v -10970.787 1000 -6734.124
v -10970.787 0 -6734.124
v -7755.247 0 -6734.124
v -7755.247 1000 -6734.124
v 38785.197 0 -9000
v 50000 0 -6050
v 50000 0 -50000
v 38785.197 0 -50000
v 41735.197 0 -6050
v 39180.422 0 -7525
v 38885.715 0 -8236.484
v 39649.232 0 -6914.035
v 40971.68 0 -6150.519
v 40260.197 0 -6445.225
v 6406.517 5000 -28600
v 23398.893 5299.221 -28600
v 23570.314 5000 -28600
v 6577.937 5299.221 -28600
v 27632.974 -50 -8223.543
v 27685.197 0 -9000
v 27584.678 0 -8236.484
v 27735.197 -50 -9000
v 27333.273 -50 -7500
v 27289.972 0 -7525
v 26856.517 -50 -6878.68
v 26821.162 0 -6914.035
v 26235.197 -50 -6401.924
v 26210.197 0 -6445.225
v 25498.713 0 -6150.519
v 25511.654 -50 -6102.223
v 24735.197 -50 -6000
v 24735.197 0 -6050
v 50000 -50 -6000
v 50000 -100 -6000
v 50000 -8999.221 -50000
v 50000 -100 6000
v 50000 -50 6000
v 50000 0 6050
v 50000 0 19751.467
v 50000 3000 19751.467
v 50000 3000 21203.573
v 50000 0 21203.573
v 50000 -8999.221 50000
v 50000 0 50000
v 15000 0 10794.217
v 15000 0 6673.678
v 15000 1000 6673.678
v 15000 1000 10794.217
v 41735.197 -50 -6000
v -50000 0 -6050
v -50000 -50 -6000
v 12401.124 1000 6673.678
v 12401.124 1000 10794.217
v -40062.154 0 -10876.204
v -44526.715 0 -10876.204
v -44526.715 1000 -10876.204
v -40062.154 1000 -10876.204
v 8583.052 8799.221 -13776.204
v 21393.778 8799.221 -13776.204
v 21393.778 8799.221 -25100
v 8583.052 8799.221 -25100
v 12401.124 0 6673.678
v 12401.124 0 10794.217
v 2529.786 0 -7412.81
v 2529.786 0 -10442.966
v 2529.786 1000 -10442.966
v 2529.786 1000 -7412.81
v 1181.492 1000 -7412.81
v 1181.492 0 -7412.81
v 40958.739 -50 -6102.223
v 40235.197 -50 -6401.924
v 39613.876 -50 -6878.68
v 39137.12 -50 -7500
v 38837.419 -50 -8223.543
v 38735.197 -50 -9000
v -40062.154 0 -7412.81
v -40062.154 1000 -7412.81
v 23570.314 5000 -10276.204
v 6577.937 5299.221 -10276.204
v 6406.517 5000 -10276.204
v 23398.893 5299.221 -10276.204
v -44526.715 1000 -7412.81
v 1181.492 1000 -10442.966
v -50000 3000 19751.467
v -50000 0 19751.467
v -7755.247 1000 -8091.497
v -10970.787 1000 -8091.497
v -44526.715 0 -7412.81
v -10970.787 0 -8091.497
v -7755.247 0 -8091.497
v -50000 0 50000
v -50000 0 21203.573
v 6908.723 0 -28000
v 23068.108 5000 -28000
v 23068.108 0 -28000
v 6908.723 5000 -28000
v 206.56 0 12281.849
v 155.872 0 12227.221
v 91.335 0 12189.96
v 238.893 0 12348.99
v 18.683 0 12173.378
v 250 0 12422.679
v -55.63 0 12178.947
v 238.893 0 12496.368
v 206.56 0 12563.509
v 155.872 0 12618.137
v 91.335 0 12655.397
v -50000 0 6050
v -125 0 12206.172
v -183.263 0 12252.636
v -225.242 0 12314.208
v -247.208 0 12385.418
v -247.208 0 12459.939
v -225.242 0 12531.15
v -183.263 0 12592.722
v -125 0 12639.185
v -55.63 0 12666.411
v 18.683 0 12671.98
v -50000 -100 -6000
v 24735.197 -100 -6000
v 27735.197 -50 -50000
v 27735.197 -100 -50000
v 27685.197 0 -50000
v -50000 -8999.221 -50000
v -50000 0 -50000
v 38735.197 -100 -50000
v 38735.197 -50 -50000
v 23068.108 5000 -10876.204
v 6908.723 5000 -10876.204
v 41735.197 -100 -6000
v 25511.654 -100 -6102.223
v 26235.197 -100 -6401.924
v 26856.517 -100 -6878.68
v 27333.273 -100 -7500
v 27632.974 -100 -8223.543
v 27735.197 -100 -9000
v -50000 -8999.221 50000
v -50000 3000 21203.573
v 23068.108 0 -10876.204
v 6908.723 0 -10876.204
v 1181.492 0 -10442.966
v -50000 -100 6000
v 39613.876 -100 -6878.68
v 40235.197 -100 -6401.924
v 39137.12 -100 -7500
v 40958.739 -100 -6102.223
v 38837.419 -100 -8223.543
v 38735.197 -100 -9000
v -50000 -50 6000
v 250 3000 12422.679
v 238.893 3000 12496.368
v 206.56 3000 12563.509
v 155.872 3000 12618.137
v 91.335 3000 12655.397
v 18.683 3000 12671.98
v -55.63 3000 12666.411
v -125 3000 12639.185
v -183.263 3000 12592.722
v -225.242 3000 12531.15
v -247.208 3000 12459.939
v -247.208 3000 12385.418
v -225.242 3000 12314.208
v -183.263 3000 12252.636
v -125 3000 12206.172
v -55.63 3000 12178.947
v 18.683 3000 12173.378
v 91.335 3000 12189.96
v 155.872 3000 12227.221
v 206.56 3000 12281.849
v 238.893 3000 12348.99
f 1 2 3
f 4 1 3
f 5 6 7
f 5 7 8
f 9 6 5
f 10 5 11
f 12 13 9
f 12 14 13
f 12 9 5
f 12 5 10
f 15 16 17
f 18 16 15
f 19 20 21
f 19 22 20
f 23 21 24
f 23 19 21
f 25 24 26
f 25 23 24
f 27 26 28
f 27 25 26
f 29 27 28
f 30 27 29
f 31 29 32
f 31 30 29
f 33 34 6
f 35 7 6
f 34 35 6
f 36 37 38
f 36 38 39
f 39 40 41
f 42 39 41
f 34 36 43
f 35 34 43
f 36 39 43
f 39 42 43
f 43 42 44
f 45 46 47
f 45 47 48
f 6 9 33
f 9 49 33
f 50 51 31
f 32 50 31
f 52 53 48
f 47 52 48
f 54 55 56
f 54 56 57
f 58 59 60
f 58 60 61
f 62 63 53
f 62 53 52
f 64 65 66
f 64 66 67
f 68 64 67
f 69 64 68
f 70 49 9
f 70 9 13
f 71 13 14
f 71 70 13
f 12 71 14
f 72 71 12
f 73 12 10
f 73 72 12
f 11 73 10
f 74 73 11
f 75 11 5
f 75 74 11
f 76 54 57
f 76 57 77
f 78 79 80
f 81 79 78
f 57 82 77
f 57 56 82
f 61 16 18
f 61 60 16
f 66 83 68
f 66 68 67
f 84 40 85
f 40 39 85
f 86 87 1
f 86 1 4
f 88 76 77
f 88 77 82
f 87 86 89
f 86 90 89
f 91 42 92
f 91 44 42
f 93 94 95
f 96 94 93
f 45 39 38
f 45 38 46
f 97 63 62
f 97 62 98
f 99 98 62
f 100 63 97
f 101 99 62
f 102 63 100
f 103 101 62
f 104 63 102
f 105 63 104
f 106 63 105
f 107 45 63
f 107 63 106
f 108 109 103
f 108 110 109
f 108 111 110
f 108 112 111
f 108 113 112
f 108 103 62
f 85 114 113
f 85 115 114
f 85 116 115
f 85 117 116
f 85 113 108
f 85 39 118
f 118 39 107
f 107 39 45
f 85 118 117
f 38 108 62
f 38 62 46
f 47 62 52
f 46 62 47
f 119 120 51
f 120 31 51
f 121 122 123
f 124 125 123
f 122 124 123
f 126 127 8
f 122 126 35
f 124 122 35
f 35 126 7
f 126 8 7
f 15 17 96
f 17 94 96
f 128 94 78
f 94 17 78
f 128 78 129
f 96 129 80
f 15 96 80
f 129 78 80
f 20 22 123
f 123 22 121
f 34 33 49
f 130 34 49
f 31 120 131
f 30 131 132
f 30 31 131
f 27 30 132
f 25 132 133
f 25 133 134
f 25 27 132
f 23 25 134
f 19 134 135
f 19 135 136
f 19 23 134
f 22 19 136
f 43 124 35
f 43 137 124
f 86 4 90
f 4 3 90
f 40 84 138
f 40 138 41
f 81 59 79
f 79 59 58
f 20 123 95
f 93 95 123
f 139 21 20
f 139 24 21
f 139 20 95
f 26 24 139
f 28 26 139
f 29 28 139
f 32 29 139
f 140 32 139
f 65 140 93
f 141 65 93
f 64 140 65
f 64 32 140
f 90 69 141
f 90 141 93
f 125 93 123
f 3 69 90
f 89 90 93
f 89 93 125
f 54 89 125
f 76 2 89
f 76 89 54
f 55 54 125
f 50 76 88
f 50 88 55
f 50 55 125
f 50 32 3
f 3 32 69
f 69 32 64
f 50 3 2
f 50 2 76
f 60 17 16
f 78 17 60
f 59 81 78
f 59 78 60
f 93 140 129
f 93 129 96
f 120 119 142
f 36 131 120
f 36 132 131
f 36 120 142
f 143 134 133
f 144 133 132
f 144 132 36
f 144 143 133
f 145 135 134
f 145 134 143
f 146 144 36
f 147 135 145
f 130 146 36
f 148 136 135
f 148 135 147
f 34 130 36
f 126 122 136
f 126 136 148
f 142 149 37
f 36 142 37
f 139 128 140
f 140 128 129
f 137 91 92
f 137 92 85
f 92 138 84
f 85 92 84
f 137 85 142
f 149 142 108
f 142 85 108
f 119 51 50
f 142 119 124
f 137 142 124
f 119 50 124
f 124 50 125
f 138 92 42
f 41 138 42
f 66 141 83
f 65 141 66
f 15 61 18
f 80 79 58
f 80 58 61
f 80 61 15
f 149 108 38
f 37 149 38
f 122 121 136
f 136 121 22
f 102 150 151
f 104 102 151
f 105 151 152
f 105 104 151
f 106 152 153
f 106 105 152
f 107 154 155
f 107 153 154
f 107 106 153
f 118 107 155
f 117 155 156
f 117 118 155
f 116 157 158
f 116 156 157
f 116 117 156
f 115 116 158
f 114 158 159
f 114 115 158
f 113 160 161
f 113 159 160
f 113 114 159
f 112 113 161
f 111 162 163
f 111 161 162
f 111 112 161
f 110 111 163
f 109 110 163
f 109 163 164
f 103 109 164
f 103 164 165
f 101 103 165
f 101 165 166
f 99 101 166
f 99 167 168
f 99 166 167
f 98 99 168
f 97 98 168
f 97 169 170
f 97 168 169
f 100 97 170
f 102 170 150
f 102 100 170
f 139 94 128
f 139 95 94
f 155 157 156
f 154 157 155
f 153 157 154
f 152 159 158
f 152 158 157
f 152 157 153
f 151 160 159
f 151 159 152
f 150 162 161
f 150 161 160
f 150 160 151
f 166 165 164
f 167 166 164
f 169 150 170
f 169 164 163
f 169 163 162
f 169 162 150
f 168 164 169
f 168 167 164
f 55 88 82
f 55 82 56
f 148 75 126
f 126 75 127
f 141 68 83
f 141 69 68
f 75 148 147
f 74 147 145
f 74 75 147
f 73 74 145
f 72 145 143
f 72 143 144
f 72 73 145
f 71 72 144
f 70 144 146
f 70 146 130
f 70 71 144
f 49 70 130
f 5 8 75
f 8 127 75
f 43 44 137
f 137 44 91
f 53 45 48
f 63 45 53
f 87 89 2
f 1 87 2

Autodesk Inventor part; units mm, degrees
ref_plane "YZ Plane" through (0, 0, 0) normal (1, 0, 0) x (0, 1, 0)
ref_plane "XZ Plane" through (0, 0, 0) normal (0, 1, 0) x (-1, 0, 0)
sketch "Sketch1" plane through (0, 0, 0) normal (0, 1, 0) x (-1, 0, 0)
  line L0 (50000, 50000) -> (-50000, 50000)
  line L1 (-50000, 50000) -> (-50000, -50000)
  line L2 (-50000, -50000) -> (50000, -50000)
  line L3 (50000, -50000) -> (50000, 50000)
  line L4 (50000, 50000) -> (-50000, -50000) construction
  line L5 (-50000, 50000) -> (50000, -50000) construction
  point P0 (0, 0)
  dimension "d0" = 100000
  dimension "d1" = 100000
extrude "Extrusion1" add sketch "Sketch1" against normal blind 3000
sketch "Sketch2" plane through (0, 0, 0) normal (0, 1, 0) x (1, 0, 0)
  line L0 (50000, -50000) -> (50000, 50000) projected
  line L1 (50000, 50000) -> (-50000, 50000) projected
  line L2 (-50000, 50000) -> (-50000, -50000) projected
  line L3 (-50000, -50000) -> (50000, -50000) projected
  line L4 (50000, 50000) -> (50000, -50000) projected
  line L5 (-50000, -6000) -> (50000, -6000)
  line L6 (50000, -6000) -> (50000, 6000)
  line L7 (-50000, 6000) -> (-50000, -6000)
  line L8 (-50000, -6000) -> (50000, 6000) construction
  line L9 (50000, -6000) -> (-50000, 6000) construction
  line L10 (-50000, 50000) -> (50000, 50000) projected
  line L11 (38735.1966, 9000) -> (38735.1966, 50000)
  line L12 (38735.1966, 50000) -> (27735.1966, 50000)
  line L13 (27735.1966, 50000) -> (27735.1966, 9000)
  line L14 (50000, 6000) -> (41735.1966, 6000)
  line L15 (24735.1966, 6000) -> (-50000, 6000)
  arc A0 (24735.1966, 6000) -> (27735.1966, 9000) centre (24735.1966, 9000) ccw
  arc A1 (38735.1966, 9000) -> (41735.1966, 6000) centre (41735.1966, 9000) ccw
  point P0 (0, 0)
  dimension "d5" = 11000
  dimension "d6" = 3000
extrude "Extrusion2" cut sketch "Sketch2" against normal blind 100 contours L5 L2 L15 A0 L13 L1 L11 A1 L14 L0
sketch "Sketch3" plane through (0, 0, 0) normal (0, 1, 0) x (1, 0, 0)
  line L0 (50000, 50000) -> (50000, -50000) projected
  line L1 (50000, -50000) -> (-50000, -50000) projected
  line L2 (-50000, -50000) -> (-50000, 50000) projected
  line L3 (-50000, 50000) -> (50000, 50000) projected
  line L4 (-50000, 6000) -> (24735.1966, 6000) projected
  arc A0 (24735.1966, 6000) -> (27735.1966, 9000) centre (24735.1966, 9000) ccw projected
  line L5 (27735.1966, 9000) -> (27735.1966, 50000) projected
  line L6 (27735.1966, 50000) -> (-50000, 50000) projected
  line L7 (-50000, 50000) -> (-50000, 6000) projected
  line L8 (23068.1077, 10876.2035) -> (6908.7226, 10876.2035)
  line L9 (6908.7226, 10876.2035) -> (6908.7226, 28000)
  line L10 (6908.7226, 28000) -> (23068.1077, 28000)
  line L11 (23068.1077, 28000) -> (23068.1077, 10876.2035)
  line L12 (23068.1077, 10876.2035) -> (6908.7226, 28000) construction
  line L13 (6908.7226, 10876.2035) -> (23068.1077, 28000) construction
  point P0 (0, 0)
  point P1 (14988.4151, 19438.1018)
extrude "Extrusion3" add sketch "Sketch3" along normal blind 5000 contours L8 L9 L10 L11
sketch "Sketch4" plane through (23068.1077, 0, -28000) normal (0, 0, -1) x (-1, 0, 0)
  line L0 (16159.3851, 0) -> (0, 0) projected
  line L1 (16159.3851, 0) -> (16159.3851, 5000) projected
  line L2 (0, 5000) -> (16159.3851, 5000) projected
  line L3 (0, 0) -> (0, 5000) projected
  line L4 (0, 5000) -> (16159.3851, 5000) projected
  line L5 (0, 5000) -> (-502.206, 5000)
  line L6 (-502.206, 5000) -> (1674.3292, 8799.2208)
  line L7 (1674.3292, 8799.2208) -> (8079.6925, 8799.2208)
  line L8 (8079.6925, 5000) -> (8079.6925, 8799.2208)
  line L9 (16159.3851, 5000) -> (16661.5911, 5000)
  line L10 (16661.5911, 5000) -> (14485.0559, 8799.2208)
  line L11 (14485.0559, 8799.2208) -> (8079.6925, 8799.2208)
  point P0 (23068.1077, 0)
extrude "Extrusion4" add sketch "Sketch4" against normal up to surface (17123.7965 mm away) contours L2 L8 L11 L10 L9 | L5 L6 L7 L8 L2
sketch "Sketch5" plane through (6908.7226, 0, -10876.2035) normal (0, 0, 1) x (1, 0, 0)
  line L0 (16159.3851, 0) -> (0, 0) projected
  line L1 (16159.3851, 0) -> (16159.3851, 5000) projected
  line L2 (16661.5911, 5000) -> (16159.3851, 5000) projected
  line L3 (14485.0559, 8799.2208) -> (16661.5911, 5000) projected
  line L4 (1674.3292, 8799.2208) -> (14485.0559, 8799.2208) projected
  line L5 (-502.206, 5000) -> (1674.3292, 8799.2208) projected
  line L6 (0, 5000) -> (-502.206, 5000) projected
  line L7 (0, 0) -> (0, 5000) projected
  line L8 (0, 5000) -> (-502.206, 5000) projected
  line L9 (16661.5911, 5000) -> (16159.3851, 5000) projected
  line L10 (0, 5000) -> (16159.3851, 5000)
  point P0 (-6908.7226, 0)
extrude "Extrusion5" add sketch "Sketch5" along normal blind 600 contours L10 L6 L5 L4 L3 L2
ref_plane "Work Plane1" through (23068.1077, 0, -19438.1018) normal (0, 0, -1) x (-1, 0, 0)
mirror "Mirror1" about plane through (23068.1077, 0, -19438.1018) normal (0, 0, -1) of "Extrusion5"
chamfer "Chamfer1" distance 50 angle 45 7 edges at (-12632.4017, 0, -6000) (26856.517, 0, -6878.6797) (27735.1966, 0, -29500) (0, 0, 6000) (38735.1966, 0, -29500) (39613.8763, 0, -6878.6797) (45867.5983, 0, -6000)
chamfer "Chamfer2" distance 3500 angle 45 2 edges at (14988.4151, 8799.2208, -10276.2035) (14988.4151, 8799.2208, -28600)
sketch "Sketch6" plane through (0, 0, 0) normal (0, 1, 0) x (1, 0, 0)
  line L0 (-50000, -6050) -> (50000, -6050) projected
  line L1 (-50000, -6050) -> (-50000, -50000) projected
  line L2 (-50000, -50000) -> (50000, -50000) projected
  line L3 (50000, -50000) -> (50000, -6050) projected
  circle A0 centre (0, -12422.6788) radius 250
  point P0 (0, 0)
  dimension "d21" = 500
  dimension "d23" = 37577.3212
extrude "Extrusion6" add sketch "Sketch6" along normal blind 3000 contours A0
pattern_linear "Rectangular Pattern1" [suppressed]
sketch "Sketch7" plane through (0, 0, 0) normal (0, 1, 0) x (1, 0, 0)
  circle A0 centre (0, -12422.6788) radius 250 projected
  line L0 (-50000, -6050) -> (50000, -6050) projected
  line L1 (-50000, -6050) -> (-50000, -50000) projected
  line L2 (-50000, -50000) -> (50000, -50000) projected
  line L3 (50000, -50000) -> (50000, -6050) projected
  line L4 (-50000, -6050) -> (-50000, -50000) projected
  line L5 (50000, 50000) -> (50000, -50000) projected
  line L6 (-50000, -21203.5733) -> (50000, -21203.5733)
  line L7 (50000, -21203.5733) -> (50000, -19751.467)
  line L8 (50000, -19751.467) -> (-50000, -19751.467)
  line L9 (-50000, -19751.467) -> (-50000, -21203.5733)
  point P0 (0, 0)
  point P1 (-50000, -19751.467)
  point P2 (50000, -21203.5733)
extrude "Extrusion7" add sketch "Sketch7" along normal blind 3000 contours L8 L3 L6 L1
sketch "Sketch8" plane through (0, 0, 0) normal (0, 1, 0) x (1, 0, 0)
  line L0 (27685.1966, 50000) -> (27685.1966, 9000) projected
  line L1 (27685.1966, 50000) -> (-50000, 50000) projected
  line L2 (-50000, 50000) -> (-50000, 6050) projected
  line L3 (24735.1966, 6050) -> (-50000, 6050) projected
  arc A0 (24735.1966, 6050) -> (27685.1966, 9000) centre (24735.1966, 9000) ccw projected
  line L4 (23068.1077, 28000) -> (23068.1077, 10876.2035) projected
  line L5 (23068.1077, 10876.2035) -> (6908.7226, 10876.2035) projected
  line L6 (6908.7226, 10876.2035) -> (6908.7226, 28000) projected
  line L7 (6908.7226, 28000) -> (23068.1077, 28000) projected
  line L8 (-50000, -19751.467) -> (50000, -19751.467) projected
  line L9 (50000, -19751.467) -> (50000, -6050) projected
  line L10 (-50000, -6050) -> (50000, -6050) projected
  line L11 (-50000, -6050) -> (-50000, -19751.467) projected
  circle A1 centre (0, -12422.6788) radius 250 projected
  line L12 (-7755.2468, 8091.4966) -> (-10970.7872, 8091.4966)
  line L13 (-10970.7872, 8091.4966) -> (-10970.7872, 6734.1239)
  line L14 (-10970.7872, 6734.1239) -> (-7755.2468, 6734.1239)
  line L15 (-7755.2468, 6734.1239) -> (-7755.2468, 8091.4966)
  line L16 (-3927.8334, -1038.8233) -> (-1060.9343, -1038.8233)
  line L17 (-1060.9343, -1038.8233) -> (-1060.9343, -3437.3677)
  line L18 (-1060.9343, -3437.3677) -> (-3927.8334, -3437.3677)
  line L19 (-3927.8334, -3437.3677) -> (-3927.8334, -1038.8233)
  line L20 (-22605.2556, -1038.8233) -> (-21044.0729, -1038.8233)
  line L21 (-21044.0729, -1038.8233) -> (-21044.0729, -5069.5133)
  line L22 (-21044.0729, -5069.5133) -> (-22605.2556, -5069.5133)
  line L23 (-22605.2556, -5069.5133) -> (-22605.2556, -1038.8233)
  line L24 (1181.4921, 10442.9662) -> (2529.7862, 10442.9662)
  line L25 (2529.7862, 10442.9662) -> (2529.7862, 7412.8102)
  line L26 (2529.7862, 7412.8102) -> (1181.4921, 7412.8102)
  line L27 (1181.4921, 7412.8102) -> (1181.4921, 10442.9662)
  line L28 (-44526.7154, 10876.2035) -> (-40062.1541, 10876.2035)
  line L29 (-40062.1541, 10876.2035) -> (-40062.1541, 7412.8102)
  line L30 (-40062.1541, 7412.8102) -> (-44526.7154, 7412.8102)
  line L31 (-44526.7154, 7412.8102) -> (-44526.7154, 10876.2035)
  line L32 (12401.1238, -6673.6776) -> (15000, -6673.6776)
  line L33 (15000, -6673.6776) -> (15000, -10794.2169)
  line L34 (15000, -10794.2169) -> (12401.1238, -10794.2169)
  line L35 (12401.1238, -10794.2169) -> (12401.1238, -6673.6776)
  point P0 (0, 0)
extrude "Extrusion8" add sketch "Sketch8" along normal blind 1000 contours L15 L14 L13 L12 | L24 L25 L26 L27 | L28 L29 L30 L31 | L32 L33 L34 L35
sketch "Sketch9" plane through (0, 0, 0) normal (0, 1, 0) x (1, 0, 0)
  circle A0 centre (-7079.3551, -7895.0186) radius 1405.5966
  circle A1 centre (-3459.7598, 8393.1608) radius 825.3947
  circle A2 centre (15217.3522, 7567.766) radius 874.7148
  circle A3 centre (6747.4991, -9300.6152) radius 1543.0453
  point P0 (0, 0)
extrude "Extrusion9" [suppressed]
sketch "Sketch10" plane through (0, -3000, 0) normal (0, -1, 0) x (1, 0, 0)
  line L0 (50000, -50000) -> (50000, 50000) projected
  line L1 (50000, 50000) -> (-50000, 50000) projected
  line L2 (-50000, 50000) -> (-50000, -50000) projected
  line L3 (-50000, -50000) -> (50000, -50000) projected
  point P0 (0, 0)
extrude "Extrusion10" add sketch "Sketch10" along normal blind 5999.2209
properties part number "scene1"
